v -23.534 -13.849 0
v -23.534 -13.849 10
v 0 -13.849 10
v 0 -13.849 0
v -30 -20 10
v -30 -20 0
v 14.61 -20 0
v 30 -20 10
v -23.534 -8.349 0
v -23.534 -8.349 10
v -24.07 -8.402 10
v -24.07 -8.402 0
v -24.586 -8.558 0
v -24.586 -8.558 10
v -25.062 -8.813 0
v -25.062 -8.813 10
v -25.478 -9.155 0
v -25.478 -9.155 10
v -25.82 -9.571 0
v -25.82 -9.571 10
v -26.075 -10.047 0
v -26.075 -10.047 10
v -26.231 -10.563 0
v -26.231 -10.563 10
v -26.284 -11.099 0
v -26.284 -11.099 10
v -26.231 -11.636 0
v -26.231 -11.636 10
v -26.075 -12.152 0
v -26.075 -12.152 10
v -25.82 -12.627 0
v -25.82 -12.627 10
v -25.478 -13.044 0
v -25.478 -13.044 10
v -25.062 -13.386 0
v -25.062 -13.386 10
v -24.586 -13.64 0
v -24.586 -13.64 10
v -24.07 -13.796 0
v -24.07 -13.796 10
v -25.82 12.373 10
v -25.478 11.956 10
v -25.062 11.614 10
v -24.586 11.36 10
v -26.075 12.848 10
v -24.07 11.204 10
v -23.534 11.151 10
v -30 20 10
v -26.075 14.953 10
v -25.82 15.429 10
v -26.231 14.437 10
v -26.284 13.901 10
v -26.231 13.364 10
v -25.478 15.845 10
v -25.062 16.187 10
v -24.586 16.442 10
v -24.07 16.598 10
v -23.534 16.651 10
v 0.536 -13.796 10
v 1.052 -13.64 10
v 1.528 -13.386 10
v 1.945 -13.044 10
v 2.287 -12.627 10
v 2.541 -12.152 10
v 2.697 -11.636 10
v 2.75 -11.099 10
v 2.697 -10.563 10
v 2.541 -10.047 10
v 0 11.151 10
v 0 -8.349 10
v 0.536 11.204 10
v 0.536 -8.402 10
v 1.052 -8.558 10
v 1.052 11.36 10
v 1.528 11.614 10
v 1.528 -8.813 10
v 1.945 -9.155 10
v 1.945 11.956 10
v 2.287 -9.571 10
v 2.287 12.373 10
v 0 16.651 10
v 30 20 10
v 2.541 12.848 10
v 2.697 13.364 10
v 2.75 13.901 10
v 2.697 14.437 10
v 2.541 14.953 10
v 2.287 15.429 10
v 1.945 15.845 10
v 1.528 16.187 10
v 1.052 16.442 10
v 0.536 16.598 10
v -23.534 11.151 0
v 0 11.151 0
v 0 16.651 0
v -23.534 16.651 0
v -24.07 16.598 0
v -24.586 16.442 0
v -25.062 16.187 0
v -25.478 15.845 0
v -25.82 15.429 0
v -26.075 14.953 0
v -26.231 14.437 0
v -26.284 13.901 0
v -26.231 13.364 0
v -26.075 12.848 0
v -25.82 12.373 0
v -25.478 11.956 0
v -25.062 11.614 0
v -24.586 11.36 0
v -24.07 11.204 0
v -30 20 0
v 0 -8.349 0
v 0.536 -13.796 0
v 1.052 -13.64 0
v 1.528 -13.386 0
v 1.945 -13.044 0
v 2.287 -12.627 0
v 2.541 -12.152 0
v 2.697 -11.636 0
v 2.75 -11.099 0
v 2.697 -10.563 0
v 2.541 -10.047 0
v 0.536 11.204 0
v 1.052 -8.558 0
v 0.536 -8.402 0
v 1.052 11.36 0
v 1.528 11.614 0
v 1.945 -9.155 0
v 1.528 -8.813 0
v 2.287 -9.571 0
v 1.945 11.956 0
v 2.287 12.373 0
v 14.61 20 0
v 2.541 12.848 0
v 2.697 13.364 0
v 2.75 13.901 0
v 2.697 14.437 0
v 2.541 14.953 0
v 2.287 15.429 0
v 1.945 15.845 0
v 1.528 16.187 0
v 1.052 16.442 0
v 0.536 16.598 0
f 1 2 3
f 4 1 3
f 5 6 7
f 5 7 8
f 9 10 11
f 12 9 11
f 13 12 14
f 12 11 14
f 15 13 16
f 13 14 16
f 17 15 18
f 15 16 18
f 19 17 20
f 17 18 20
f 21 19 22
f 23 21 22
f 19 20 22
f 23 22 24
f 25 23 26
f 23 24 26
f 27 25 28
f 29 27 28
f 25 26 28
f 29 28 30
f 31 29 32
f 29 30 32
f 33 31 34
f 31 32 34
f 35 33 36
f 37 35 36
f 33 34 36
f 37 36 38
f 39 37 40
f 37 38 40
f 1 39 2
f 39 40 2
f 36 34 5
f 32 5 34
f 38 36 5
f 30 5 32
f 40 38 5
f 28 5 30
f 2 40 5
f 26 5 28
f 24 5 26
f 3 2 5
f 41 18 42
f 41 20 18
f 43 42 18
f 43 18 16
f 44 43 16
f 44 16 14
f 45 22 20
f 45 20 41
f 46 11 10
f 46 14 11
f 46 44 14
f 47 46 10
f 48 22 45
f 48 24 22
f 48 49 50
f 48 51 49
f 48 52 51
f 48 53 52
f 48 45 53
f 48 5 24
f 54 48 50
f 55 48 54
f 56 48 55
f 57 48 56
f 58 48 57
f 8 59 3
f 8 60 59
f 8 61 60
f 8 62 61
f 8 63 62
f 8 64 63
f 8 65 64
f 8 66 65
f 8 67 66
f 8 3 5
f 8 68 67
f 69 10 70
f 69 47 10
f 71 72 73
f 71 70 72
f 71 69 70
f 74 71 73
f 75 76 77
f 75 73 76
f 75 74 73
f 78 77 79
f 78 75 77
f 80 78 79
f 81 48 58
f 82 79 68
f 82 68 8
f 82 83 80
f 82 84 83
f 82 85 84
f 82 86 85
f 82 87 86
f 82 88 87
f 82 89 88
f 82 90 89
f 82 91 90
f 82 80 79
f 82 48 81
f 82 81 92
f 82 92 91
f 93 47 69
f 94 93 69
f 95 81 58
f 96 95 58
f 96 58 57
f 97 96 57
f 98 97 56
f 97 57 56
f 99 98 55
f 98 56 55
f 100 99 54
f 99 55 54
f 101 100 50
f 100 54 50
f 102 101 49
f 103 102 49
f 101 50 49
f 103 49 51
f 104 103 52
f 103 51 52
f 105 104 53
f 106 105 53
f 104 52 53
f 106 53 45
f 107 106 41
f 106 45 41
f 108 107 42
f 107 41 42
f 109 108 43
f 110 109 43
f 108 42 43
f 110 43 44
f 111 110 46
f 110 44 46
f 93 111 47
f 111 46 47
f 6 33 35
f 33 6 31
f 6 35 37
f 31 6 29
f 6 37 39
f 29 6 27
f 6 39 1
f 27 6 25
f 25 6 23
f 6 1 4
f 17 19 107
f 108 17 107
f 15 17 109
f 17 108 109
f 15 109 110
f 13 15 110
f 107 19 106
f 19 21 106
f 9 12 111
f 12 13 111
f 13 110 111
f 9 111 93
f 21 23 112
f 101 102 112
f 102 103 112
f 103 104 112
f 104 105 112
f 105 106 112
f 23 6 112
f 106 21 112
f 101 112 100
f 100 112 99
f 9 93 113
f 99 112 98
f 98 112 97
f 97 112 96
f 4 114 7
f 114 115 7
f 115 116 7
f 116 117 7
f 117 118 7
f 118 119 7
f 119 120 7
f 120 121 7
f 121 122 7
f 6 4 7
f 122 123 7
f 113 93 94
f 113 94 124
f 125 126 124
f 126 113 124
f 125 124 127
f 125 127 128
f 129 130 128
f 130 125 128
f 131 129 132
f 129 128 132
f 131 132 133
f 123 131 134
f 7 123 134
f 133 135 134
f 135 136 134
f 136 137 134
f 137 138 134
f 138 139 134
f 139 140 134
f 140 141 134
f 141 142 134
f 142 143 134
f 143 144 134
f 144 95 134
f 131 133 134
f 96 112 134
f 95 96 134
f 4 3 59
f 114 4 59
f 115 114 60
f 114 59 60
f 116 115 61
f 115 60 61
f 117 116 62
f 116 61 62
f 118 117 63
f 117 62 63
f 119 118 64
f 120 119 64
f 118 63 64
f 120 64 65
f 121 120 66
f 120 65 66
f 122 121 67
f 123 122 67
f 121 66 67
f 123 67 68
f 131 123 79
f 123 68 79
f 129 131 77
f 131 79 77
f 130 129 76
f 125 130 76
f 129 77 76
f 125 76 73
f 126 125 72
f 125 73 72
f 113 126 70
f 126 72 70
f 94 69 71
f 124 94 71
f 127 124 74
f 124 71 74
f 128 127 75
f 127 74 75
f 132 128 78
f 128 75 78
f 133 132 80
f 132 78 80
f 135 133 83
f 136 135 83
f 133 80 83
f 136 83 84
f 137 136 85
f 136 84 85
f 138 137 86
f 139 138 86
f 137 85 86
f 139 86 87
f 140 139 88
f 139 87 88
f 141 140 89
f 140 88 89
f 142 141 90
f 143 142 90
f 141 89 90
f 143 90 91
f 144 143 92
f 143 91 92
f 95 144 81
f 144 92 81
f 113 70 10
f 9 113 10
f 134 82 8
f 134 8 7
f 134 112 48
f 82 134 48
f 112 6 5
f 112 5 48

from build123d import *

# Parameters (mm, degrees)
F0_W     = 60
F0_H     = 40
F1_DEPTH = 10
F4_DEPTH = 40
F5_DEPTH = 25
F7_DEPTH = 40


with BuildPart() as f1:
    # F0 (on Top) → F1 (new body)
    with BuildSketch(Plane.XY):
        Rectangle(F0_W, F0_H)
    extrude(amount=F1_DEPTH)

    # F3 (on face) → F4 (join)
    with BuildSketch(Plane.XZ.offset(20)):
        Polygon((0, 0), (14.609862, 10), (-30, 10), (-30, 0), align=None)
    extrude(amount=-F4_DEPTH)

    # F2 (on face) → F5 (cut)
    with BuildSketch(Plane.XY.offset(10)):
        with BuildLine():
            ThreePointArc((0, 11.150862), (2.75, 13.900862), (0, 16.650862))
            Line((0, 16.650862), (-23.533953, 16.650862))
            ThreePointArc((-23.533953, 16.650862), (-26.283953, 13.900862), (-23.533953, 11.150862))
            Line((-23.533953, 11.150862), (0, 11.150862))
        make_face()
        with BuildLine():
            ThreePointArc((0, -13.849138), (2.75, -11.099138), (0, -8.349138))
            Line((0, -8.349138), (-23.533953, -8.349138))
            ThreePointArc((-23.533953, -8.349138), (-26.283953, -11.099138), (-23.533953, -13.849138))
            Line((-23.533953, -13.849138), (0, -13.849138))
        make_face()
    extrude(amount=-F5_DEPTH, mode=Mode.SUBTRACT)

    # F6 (on face) → F7 (cut)
    with BuildSketch(Plane.XZ.offset(20)):
        Polygon((30, 0), (30, 10), (14.609862, 0), align=None)
    extrude(amount=-F7_DEPTH, mode=Mode.SUBTRACT)


solid = f1.part
